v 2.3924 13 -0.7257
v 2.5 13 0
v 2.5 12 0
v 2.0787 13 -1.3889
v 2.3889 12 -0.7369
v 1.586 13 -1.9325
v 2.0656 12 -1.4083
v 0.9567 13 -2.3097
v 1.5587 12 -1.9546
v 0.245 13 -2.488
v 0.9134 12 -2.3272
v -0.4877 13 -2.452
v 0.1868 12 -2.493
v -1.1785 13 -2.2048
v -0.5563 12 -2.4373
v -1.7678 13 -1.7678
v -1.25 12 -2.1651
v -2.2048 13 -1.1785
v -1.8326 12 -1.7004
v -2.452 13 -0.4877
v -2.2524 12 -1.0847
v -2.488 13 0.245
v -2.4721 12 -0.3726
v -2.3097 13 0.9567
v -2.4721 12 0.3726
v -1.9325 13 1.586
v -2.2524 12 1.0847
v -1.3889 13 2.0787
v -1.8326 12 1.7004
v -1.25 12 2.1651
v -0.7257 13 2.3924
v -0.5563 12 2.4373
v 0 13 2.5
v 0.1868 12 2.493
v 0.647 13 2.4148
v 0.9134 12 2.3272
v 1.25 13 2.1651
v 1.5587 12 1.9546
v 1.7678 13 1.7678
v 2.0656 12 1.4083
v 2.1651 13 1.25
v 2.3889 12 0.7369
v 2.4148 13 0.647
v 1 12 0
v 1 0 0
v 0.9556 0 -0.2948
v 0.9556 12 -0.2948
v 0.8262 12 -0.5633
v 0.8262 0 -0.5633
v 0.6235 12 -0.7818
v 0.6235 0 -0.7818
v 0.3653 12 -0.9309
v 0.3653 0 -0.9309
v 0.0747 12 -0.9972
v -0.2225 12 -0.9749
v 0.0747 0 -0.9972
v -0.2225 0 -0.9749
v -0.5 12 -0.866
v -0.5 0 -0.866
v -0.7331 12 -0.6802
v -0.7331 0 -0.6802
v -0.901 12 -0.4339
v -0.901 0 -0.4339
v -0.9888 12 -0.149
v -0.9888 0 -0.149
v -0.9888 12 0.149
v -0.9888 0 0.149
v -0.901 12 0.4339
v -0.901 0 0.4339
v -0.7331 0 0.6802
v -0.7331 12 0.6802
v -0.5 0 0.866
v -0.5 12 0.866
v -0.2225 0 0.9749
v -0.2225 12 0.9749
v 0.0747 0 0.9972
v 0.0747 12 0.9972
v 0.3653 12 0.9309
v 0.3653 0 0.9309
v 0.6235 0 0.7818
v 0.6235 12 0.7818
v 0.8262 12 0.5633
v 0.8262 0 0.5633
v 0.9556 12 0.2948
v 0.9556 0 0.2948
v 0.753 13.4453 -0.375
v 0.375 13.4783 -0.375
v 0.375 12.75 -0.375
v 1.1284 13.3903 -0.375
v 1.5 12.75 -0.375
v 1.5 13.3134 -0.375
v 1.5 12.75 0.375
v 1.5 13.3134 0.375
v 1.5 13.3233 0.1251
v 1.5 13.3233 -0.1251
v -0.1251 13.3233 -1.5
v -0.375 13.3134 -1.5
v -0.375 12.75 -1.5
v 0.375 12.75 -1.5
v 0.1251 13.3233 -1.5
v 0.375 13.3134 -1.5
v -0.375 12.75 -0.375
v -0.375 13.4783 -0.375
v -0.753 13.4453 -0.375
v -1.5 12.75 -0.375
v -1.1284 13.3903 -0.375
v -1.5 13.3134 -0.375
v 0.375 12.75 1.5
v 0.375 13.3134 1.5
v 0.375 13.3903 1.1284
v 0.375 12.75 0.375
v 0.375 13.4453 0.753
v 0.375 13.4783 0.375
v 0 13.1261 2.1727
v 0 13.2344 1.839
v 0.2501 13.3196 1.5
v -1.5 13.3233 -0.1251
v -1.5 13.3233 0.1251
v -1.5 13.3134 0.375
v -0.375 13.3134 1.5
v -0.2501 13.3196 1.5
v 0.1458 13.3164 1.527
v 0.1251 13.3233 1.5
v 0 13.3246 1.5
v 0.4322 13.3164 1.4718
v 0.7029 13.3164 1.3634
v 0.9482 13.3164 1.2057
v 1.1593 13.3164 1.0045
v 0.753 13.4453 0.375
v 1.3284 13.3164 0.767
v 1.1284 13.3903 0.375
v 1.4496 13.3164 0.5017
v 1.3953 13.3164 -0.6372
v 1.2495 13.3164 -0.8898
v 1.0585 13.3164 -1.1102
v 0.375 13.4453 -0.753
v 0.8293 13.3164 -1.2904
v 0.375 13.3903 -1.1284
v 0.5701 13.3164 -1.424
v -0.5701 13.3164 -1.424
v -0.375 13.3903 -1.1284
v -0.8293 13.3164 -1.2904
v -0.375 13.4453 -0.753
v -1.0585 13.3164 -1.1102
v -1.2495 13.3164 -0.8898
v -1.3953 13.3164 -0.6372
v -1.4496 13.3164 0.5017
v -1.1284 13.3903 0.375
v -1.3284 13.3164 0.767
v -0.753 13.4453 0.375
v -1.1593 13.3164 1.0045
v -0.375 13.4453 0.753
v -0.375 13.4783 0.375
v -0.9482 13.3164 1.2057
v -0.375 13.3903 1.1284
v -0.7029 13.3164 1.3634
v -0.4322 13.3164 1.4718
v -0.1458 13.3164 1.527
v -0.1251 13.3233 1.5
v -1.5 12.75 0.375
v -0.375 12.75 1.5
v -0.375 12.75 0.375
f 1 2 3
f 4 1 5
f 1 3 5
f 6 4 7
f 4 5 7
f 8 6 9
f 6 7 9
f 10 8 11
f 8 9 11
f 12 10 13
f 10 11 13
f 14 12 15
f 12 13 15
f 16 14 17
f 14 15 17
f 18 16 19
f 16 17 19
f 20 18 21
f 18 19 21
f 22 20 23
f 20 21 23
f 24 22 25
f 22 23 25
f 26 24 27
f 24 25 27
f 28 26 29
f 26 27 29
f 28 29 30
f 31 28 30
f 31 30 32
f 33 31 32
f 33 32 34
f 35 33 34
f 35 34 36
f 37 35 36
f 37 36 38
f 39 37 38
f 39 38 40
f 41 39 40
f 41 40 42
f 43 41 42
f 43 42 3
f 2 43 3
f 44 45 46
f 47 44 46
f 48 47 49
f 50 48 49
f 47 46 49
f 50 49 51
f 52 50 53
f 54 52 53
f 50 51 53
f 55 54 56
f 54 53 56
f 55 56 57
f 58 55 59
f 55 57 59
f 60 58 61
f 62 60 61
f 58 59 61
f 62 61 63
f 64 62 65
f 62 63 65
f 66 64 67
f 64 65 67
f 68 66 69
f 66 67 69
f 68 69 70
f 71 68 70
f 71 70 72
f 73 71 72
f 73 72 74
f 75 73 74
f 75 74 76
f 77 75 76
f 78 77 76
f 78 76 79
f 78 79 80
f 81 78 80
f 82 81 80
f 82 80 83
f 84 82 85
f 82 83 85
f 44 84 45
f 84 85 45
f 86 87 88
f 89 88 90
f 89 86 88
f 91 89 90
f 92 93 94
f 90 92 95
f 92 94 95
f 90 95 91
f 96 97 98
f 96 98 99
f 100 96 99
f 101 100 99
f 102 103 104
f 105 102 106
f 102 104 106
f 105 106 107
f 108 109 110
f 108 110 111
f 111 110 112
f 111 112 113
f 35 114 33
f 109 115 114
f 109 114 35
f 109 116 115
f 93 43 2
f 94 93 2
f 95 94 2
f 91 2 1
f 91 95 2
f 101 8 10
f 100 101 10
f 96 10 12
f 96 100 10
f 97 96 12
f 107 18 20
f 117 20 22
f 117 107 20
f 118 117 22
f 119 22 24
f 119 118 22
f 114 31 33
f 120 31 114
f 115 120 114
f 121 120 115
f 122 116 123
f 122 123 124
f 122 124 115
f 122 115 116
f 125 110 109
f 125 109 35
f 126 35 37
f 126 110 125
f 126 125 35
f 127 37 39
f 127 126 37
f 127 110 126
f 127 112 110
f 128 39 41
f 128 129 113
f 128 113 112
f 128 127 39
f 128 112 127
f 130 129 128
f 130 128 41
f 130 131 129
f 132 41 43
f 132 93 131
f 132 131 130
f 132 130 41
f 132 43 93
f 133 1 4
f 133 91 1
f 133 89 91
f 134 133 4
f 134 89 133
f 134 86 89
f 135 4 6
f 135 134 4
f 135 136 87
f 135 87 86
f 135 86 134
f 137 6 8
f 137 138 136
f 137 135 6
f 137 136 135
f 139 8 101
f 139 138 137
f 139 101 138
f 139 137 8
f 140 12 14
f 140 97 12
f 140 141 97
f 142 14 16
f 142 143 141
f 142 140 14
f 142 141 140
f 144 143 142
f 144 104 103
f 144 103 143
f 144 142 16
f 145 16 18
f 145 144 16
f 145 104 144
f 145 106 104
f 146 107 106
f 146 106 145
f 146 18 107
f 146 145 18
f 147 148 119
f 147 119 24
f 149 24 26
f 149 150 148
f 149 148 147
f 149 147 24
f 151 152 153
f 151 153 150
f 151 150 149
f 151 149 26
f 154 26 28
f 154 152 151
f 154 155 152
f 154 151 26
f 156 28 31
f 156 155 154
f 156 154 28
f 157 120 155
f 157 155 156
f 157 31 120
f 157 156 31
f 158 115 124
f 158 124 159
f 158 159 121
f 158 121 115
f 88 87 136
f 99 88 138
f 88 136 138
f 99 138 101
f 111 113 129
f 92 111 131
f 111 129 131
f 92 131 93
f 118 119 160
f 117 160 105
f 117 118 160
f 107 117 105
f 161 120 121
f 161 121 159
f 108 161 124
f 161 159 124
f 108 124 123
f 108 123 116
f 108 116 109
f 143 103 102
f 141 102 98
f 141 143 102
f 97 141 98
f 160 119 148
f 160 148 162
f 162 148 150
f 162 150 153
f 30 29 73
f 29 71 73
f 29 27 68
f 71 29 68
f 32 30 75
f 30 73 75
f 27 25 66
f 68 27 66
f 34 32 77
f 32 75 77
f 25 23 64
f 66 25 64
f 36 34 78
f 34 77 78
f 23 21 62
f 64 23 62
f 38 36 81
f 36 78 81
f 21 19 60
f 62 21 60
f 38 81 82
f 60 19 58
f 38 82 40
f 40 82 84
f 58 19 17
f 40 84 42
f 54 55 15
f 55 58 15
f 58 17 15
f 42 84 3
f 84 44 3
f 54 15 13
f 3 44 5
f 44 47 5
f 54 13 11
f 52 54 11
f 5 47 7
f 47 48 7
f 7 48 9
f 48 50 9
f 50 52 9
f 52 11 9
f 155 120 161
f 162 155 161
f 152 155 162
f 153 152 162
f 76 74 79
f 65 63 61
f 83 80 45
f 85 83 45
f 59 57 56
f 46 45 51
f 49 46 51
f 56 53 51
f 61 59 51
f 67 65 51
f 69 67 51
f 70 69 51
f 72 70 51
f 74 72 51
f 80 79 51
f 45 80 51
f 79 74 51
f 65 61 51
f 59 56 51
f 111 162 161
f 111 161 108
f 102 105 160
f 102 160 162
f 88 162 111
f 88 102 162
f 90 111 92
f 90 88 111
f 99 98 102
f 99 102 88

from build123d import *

# Parameters (mm, degrees)
SKETCH1_R           = 1
BOSS_EXTRUDE1_DEPTH = 12
SKETCH2_R           = 2.5
BOSS_EXTRUDE2_DEPTH = 1
DOME1_FACE_RADIUS   = 2.5
DOME1_HEIGHT        = 0.5
SKETCH3_W           = 1.125
SKETCH3_H           = 0.75
SKETCH3_W_2         = 0.75
SKETCH3_H_2         = 1.125
CUT_EXTRUDE1_DEPTH  = 0.75


with BuildPart() as part:
    # Sketch1 → Boss-Extrude1 (new body)
    with BuildSketch(Plane(origin=(0, 0, 0), x_dir=(1, 0, 0), z_dir=(0, 1, 0))):
        Circle(SKETCH1_R)
    extrude(amount=BOSS_EXTRUDE1_DEPTH)

    # Sketch2 → Boss-Extrude2 (add)
    with BuildSketch(Plane(origin=(0, 12, 0), x_dir=(1, 0, 0), z_dir=(0, 1, 0))):
        Circle(SKETCH2_R)
    extrude(amount=BOSS_EXTRUDE2_DEPTH)

    # Dome1: a dome of height H over a round flat face of radius A is a cap of a sphere of radius (A * A + H * H) / (2 * H)
    dome1_r = (DOME1_FACE_RADIUS * DOME1_FACE_RADIUS + DOME1_HEIGHT * DOME1_HEIGHT) / (2 * DOME1_HEIGHT)
    dome1_base = Plane((0, 13, 0), z_dir=(0, 1, 0))
    with Locations(dome1_base.offset(DOME1_HEIGHT - dome1_r)):
        dome1_ball = Sphere(dome1_r, mode=Mode.PRIVATE)
    add(split(dome1_ball, bisect_by=dome1_base, keep=Keep.TOP, mode=Mode.PRIVATE))

    # Sketch3 → Cut-Extrude1 (cut)
    with BuildSketch(Plane(origin=(0, 13.5, 0), x_dir=(1, 0, 0), z_dir=(0, 1, 0))):
        with Locations((-0.9375, 0)):
            Rectangle(SKETCH3_W, SKETCH3_H)
        Rectangle(SKETCH3_W_2, SKETCH3_H)
        with Locations((0, 0.9375)):
            Rectangle(SKETCH3_W_2, SKETCH3_H_2)
        with Locations((0.9375, 0)):
            Rectangle(SKETCH3_W, SKETCH3_H)
        with Locations((0, -0.9375)):
            Rectangle(SKETCH3_W_2, SKETCH3_H_2)
    extrude(amount=-CUT_EXTRUDE1_DEPTH, mode=Mode.SUBTRACT)


solid = part.part
